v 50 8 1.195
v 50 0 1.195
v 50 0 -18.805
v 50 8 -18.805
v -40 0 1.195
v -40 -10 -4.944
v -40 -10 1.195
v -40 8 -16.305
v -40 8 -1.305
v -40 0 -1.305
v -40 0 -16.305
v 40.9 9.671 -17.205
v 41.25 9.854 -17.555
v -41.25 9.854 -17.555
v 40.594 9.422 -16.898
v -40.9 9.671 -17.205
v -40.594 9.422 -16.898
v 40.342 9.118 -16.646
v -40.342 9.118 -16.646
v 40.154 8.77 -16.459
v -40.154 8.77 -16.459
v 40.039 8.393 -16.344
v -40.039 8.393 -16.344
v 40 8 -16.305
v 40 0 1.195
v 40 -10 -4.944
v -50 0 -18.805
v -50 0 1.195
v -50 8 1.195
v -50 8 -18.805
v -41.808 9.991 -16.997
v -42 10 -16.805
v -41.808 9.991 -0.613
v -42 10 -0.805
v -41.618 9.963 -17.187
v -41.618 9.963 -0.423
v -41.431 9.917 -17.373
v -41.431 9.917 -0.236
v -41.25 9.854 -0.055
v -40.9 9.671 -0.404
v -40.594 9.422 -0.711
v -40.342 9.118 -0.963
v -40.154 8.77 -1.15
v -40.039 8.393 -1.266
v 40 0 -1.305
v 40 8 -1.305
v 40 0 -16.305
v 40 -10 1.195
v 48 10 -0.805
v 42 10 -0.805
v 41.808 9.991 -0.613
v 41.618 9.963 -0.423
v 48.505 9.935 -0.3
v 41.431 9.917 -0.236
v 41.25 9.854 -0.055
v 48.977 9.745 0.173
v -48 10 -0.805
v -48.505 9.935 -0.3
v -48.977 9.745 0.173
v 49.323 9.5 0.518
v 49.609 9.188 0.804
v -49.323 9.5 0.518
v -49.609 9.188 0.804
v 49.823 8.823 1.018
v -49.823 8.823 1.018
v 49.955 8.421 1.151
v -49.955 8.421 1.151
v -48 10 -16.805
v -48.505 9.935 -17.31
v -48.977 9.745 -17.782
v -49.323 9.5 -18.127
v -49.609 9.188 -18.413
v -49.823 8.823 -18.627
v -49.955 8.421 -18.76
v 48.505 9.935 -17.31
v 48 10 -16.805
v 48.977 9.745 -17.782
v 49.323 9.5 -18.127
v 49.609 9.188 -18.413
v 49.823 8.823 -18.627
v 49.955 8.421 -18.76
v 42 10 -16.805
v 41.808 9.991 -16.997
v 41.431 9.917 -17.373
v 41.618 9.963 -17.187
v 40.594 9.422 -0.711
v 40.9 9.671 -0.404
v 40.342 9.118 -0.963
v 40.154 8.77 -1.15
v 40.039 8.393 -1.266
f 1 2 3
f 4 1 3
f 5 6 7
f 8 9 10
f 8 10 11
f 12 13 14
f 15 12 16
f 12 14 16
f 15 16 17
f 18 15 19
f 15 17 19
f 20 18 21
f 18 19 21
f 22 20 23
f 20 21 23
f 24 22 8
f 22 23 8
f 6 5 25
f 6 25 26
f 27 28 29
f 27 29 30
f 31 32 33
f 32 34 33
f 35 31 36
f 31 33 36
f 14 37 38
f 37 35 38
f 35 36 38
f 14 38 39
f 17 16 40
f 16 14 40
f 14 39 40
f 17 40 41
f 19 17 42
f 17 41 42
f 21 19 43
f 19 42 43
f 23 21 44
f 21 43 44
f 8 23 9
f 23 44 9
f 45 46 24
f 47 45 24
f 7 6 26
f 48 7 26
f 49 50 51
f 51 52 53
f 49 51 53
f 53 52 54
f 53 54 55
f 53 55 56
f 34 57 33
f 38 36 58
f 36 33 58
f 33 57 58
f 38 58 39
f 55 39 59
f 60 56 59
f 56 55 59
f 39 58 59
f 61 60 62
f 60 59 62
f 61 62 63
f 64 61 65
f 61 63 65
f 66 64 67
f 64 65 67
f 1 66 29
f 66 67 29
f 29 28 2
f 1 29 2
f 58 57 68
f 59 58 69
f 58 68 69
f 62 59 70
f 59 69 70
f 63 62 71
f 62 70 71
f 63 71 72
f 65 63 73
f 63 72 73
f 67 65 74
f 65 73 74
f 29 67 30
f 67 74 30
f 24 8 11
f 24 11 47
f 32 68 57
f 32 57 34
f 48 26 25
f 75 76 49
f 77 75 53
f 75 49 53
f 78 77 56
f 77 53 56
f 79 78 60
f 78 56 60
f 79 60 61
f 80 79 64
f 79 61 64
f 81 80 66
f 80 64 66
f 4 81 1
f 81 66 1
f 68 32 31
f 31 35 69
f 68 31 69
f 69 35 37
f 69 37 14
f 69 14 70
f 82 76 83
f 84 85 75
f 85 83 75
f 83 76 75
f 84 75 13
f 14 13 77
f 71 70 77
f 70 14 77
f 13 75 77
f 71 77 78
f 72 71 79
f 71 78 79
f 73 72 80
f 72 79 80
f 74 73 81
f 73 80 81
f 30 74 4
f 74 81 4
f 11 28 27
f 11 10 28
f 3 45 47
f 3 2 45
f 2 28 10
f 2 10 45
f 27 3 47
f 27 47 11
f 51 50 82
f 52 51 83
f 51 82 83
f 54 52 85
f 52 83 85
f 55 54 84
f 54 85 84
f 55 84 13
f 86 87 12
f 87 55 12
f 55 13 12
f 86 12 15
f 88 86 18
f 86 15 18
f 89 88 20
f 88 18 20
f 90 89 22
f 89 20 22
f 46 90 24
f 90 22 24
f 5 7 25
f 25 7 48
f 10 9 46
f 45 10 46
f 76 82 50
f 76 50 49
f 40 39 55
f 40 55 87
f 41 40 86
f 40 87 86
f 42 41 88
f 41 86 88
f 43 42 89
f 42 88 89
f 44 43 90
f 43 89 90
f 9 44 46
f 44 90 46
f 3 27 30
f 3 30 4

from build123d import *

# Parameters (mm, degrees)
BOSS_EXTRUDE1_DEPTH      = 10
BOSS_EXTRUDE1_DEPTH_BACK = 10
SKETCH1_W                = 100
SKETCH1_H                = 20
CUT_EXTRUDE1_DEPTH       = 100
SKETCH3_W                = 80
SKETCH3_H                = 15
CUT_EXTRUDE2_DEPTH       = 10
FILLET3_R                = 2
CUT_EXTRUDE4_DEPTH       = 10
CUT_EXTRUDE5_DEPTH       = 10
CUT_EXTRUDE6_DEPTH       = 80


with BuildPart() as part:
    # Sketch1 → Boss-Extrude1 (new, two sides: drawn at the far end of the back side and taken through both)
    with BuildSketch(Plane(origin=(0, 0, 0), x_dir=(1, 0, 0), z_dir=(0, 1, 0)).offset(-BOSS_EXTRUDE1_DEPTH_BACK)):
        with Locations((0, 8.804664723)):
            Rectangle(SKETCH1_W, SKETCH1_H)
    extrude(amount=BOSS_EXTRUDE1_DEPTH + BOSS_EXTRUDE1_DEPTH_BACK)

    # Sketch2 → Cut-Extrude1 (cut)
    with BuildSketch(Plane(origin=(50, 0, 0), x_dir=(0, 0, -1), z_dir=(1, 0, 0))):
        Polygon((-1.195335277, 0), (18.804664723, 0), (18.804664723, -10), align=None)
    extrude(amount=-CUT_EXTRUDE1_DEPTH, mode=Mode.SUBTRACT)


with BuildPart() as cut_extrude1_piece_1:
    # of the separate pieces the step leaves, piece 1, a body of its own (cut_extrude1_pieces)
    add(part.part.solids().sort_by_distance((-50, 10, 1.195335277))[0])

    # Sketch3 → Cut-Extrude2 (cut)
    with BuildSketch(Plane(origin=(0, 10, 0), x_dir=(1, 0, 0), z_dir=(0, 1, 0))):
        with Locations((0, 8.804664723)):
            Rectangle(SKETCH3_W, SKETCH3_H)
    extrude(amount=-CUT_EXTRUDE2_DEPTH, mode=Mode.SUBTRACT)

    # Fillet3
    # the kernel refuses this fillet: 2 mm, written as the material it takes off along each edge
    with BuildSketch(Plane(origin=(40, 10, -16.304664723), x_dir=(1, 0, 0), z_dir=(0, 0, 1)), Plane(origin=(-40, 10, -1.304664723), x_dir=(-1, 0, 0), z_dir=(0, 0, -1))) as fillet3_piece_1:
        with BuildLine():
            CenterArc((FILLET3_R, -FILLET3_R), FILLET3_R, 90, 90)
            Line((0, -FILLET3_R), (-FILLET3_R * 0.02, -FILLET3_R))
            Line((-FILLET3_R * 0.02, -FILLET3_R), (-FILLET3_R * 0.02, FILLET3_R * 0.02))
            Line((-FILLET3_R * 0.02, FILLET3_R * 0.02), (FILLET3_R, FILLET3_R * 0.02))
            Line((FILLET3_R, FILLET3_R * 0.02), (FILLET3_R, 0))
        make_face()
    extrude(amount=15, mode=Mode.SUBTRACT)
    with BuildSketch(Plane(origin=(-40, 10, -16.304664723), x_dir=(0, 0, -1), z_dir=(1, 0, 0)), Plane(origin=(40, 10, -1.304664723), x_dir=(0, 0, 1), z_dir=(-1, 0, 0))) as fillet3_piece_2:
        with BuildLine():
            CenterArc((FILLET3_R, -FILLET3_R), FILLET3_R, 90, 90)
            Line((0, -FILLET3_R), (-FILLET3_R * 0.02, -FILLET3_R))
            Line((-FILLET3_R * 0.02, -FILLET3_R), (-FILLET3_R * 0.02, FILLET3_R * 0.02))
            Line((-FILLET3_R * 0.02, FILLET3_R * 0.02), (FILLET3_R, FILLET3_R * 0.02))
            Line((FILLET3_R, FILLET3_R * 0.02), (FILLET3_R, 0))
        make_face()
    extrude(amount=80, mode=Mode.SUBTRACT)
    with BuildSketch(Plane(origin=(50, 10, 1.195335277), x_dir=(0, -1, 0), z_dir=(0, 0, -1)), Plane(origin=(-50, 10, -18.804664723), x_dir=(0, -1, 0), z_dir=(0, 0, 1))) as fillet3_piece_3:
        with BuildLine():
            CenterArc((FILLET3_R, FILLET3_R), FILLET3_R, 180, 90)
            Line((0, FILLET3_R), (-FILLET3_R * 0.02, FILLET3_R))
            Line((-FILLET3_R * 0.02, FILLET3_R), (-FILLET3_R * 0.02, -FILLET3_R * 0.02))
            Line((-FILLET3_R * 0.02, -FILLET3_R * 0.02), (FILLET3_R, -FILLET3_R * 0.02))
            Line((FILLET3_R, -FILLET3_R * 0.02), (FILLET3_R, 0))
        make_face()
    extrude(amount=20, mode=Mode.SUBTRACT)
    with BuildSketch(Plane(origin=(50, 10, -18.804664723), x_dir=(0, 0, 1), z_dir=(-1, 0, 0))) as fillet3_piece_4:
        with BuildLine():
            CenterArc((FILLET3_R, -FILLET3_R), FILLET3_R, 90, 90)
            Line((0, -FILLET3_R), (-FILLET3_R * 0.02, -FILLET3_R))
            Line((-FILLET3_R * 0.02, -FILLET3_R), (-FILLET3_R * 0.02, FILLET3_R * 0.02))
            Line((-FILLET3_R * 0.02, FILLET3_R * 0.02), (FILLET3_R, FILLET3_R * 0.02))
            Line((FILLET3_R, FILLET3_R * 0.02), (FILLET3_R, 0))
        make_face()
    extrude(amount=100, mode=Mode.SUBTRACT)
    with BuildSketch(Plane(origin=(-50, 10, 1.195335277), x_dir=(0, -1, 0), z_dir=(1, 0, 0))) as fillet3_piece_5:
        with BuildLine():
            CenterArc((FILLET3_R, FILLET3_R), FILLET3_R, 180, 90)
            Line((0, FILLET3_R), (-FILLET3_R * 0.02, FILLET3_R))
            Line((-FILLET3_R * 0.02, FILLET3_R), (-FILLET3_R * 0.02, -FILLET3_R * 0.02))
            Line((-FILLET3_R * 0.02, -FILLET3_R * 0.02), (FILLET3_R, -FILLET3_R * 0.02))
            Line((FILLET3_R, -FILLET3_R * 0.02), (FILLET3_R, 0))
        make_face()
    extrude(amount=100, mode=Mode.SUBTRACT)
    with BuildSketch(Plane(origin=(40, 10, -21.304664723), x_dir=(1, 0, 0), z_dir=(0, 0, 1))) as fillet3_piece_6a_section:
        with BuildLine():
            CenterArc((FILLET3_R, -FILLET3_R), FILLET3_R, 90, 90)
            Line((0, -FILLET3_R), (-FILLET3_R * 0.02, -FILLET3_R))
            Line((-FILLET3_R * 0.02, -FILLET3_R), (-FILLET3_R * 0.02, FILLET3_R * 0.02))
            Line((-FILLET3_R * 0.02, FILLET3_R * 0.02), (FILLET3_R, FILLET3_R * 0.02))
            Line((FILLET3_R, FILLET3_R * 0.02), (FILLET3_R, 0))
        make_face()
    fillet3_piece_6a = extrude(amount=20, mode=Mode.PRIVATE)
    fillet3_piece_6a = split(fillet3_piece_6a, bisect_by=Plane(origin=(40.452790229, 9.547209771, -16.304664723), z_dir=(0, 0, -1)), keep=Keep.TOP, mode=Mode.PRIVATE)
    with BuildSketch(Plane(origin=(-40, 10, -16.304664723), x_dir=(0, 0, -1), z_dir=(1, 0, 0))) as fillet3_piece_6b_section:
        with BuildLine():
            CenterArc((FILLET3_R, -FILLET3_R), FILLET3_R, 90, 90)
            Line((0, -FILLET3_R), (-FILLET3_R * 0.02, -FILLET3_R))
            Line((-FILLET3_R * 0.02, -FILLET3_R), (-FILLET3_R * 0.02, FILLET3_R * 0.02))
            Line((-FILLET3_R * 0.02, FILLET3_R * 0.02), (FILLET3_R, FILLET3_R * 0.02))
            Line((FILLET3_R, FILLET3_R * 0.02), (FILLET3_R, 0))
        make_face()
    fillet3_piece_6b = extrude(amount=85, mode=Mode.PRIVATE)
    fillet3_piece_6b = split(fillet3_piece_6b, bisect_by=Plane(origin=(40, 9.547209771, -16.757454952), z_dir=(1, 0, 0)), keep=Keep.TOP, mode=Mode.PRIVATE)
    fillet3_piece_6 = fillet3_piece_6a & fillet3_piece_6b
    add(fillet3_piece_6, mode=Mode.SUBTRACT)
    with BuildSketch(Plane(origin=(45, 10, -1.304664723), x_dir=(0, 0, 1), z_dir=(-1, 0, 0))) as fillet3_piece_7a_section:
        with BuildLine():
            CenterArc((FILLET3_R, -FILLET3_R), FILLET3_R, 90, 90)
            Line((0, -FILLET3_R), (-FILLET3_R * 0.02, -FILLET3_R))
            Line((-FILLET3_R * 0.02, -FILLET3_R), (-FILLET3_R * 0.02, FILLET3_R * 0.02))
            Line((-FILLET3_R * 0.02, FILLET3_R * 0.02), (FILLET3_R, FILLET3_R * 0.02))
            Line((FILLET3_R, FILLET3_R * 0.02), (FILLET3_R, 0))
        make_face()
    fillet3_piece_7a = extrude(amount=85, mode=Mode.PRIVATE)
    fillet3_piece_7a = split(fillet3_piece_7a, bisect_by=Plane(origin=(40, 9.547209771, -0.851874494), z_dir=(1, 0, 0)), keep=Keep.TOP, mode=Mode.PRIVATE)
    with BuildSketch(Plane(origin=(40, 10, -16.304664723), x_dir=(1, 0, 0), z_dir=(0, 0, 1))) as fillet3_piece_7b_section:
        with BuildLine():
            CenterArc((FILLET3_R, -FILLET3_R), FILLET3_R, 90, 90)
            Line((0, -FILLET3_R), (-FILLET3_R * 0.02, -FILLET3_R))
            Line((-FILLET3_R * 0.02, -FILLET3_R), (-FILLET3_R * 0.02, FILLET3_R * 0.02))
            Line((-FILLET3_R * 0.02, FILLET3_R * 0.02), (FILLET3_R, FILLET3_R * 0.02))
            Line((FILLET3_R, FILLET3_R * 0.02), (FILLET3_R, 0))
        make_face()
    fillet3_piece_7b = extrude(amount=20, mode=Mode.PRIVATE)
    fillet3_piece_7b = split(fillet3_piece_7b, bisect_by=Plane(origin=(40.452790229, 9.547209771, -1.304664723), z_dir=(0, 0, 1)), keep=Keep.TOP, mode=Mode.PRIVATE)
    fillet3_piece_7 = fillet3_piece_7a & fillet3_piece_7b
    add(fillet3_piece_7, mode=Mode.SUBTRACT)
    with BuildSketch(Plane(origin=(-40, 10, -1.304664723), x_dir=(-1, 0, 0), z_dir=(0, 0, -1))) as fillet3_piece_8a_section:
        with BuildLine():
            CenterArc((FILLET3_R, -FILLET3_R), FILLET3_R, 90, 90)
            Line((0, -FILLET3_R), (-FILLET3_R * 0.02, -FILLET3_R))
            Line((-FILLET3_R * 0.02, -FILLET3_R), (-FILLET3_R * 0.02, FILLET3_R * 0.02))
            Line((-FILLET3_R * 0.02, FILLET3_R * 0.02), (FILLET3_R, FILLET3_R * 0.02))
            Line((FILLET3_R, FILLET3_R * 0.02), (FILLET3_R, 0))
        make_face()
    fillet3_piece_8a = extrude(amount=20, mode=Mode.PRIVATE)
    fillet3_piece_8a = split(fillet3_piece_8a, bisect_by=Plane(origin=(-40.452790229, 9.547209771, -16.304664723), z_dir=(0, 0, -1)), keep=Keep.TOP, mode=Mode.PRIVATE)
    with BuildSketch(Plane(origin=(-45, 10, -16.304664723), x_dir=(0, 0, -1), z_dir=(1, 0, 0))) as fillet3_piece_8b_section:
        with BuildLine():
            CenterArc((FILLET3_R, -FILLET3_R), FILLET3_R, 90, 90)
            Line((0, -FILLET3_R), (-FILLET3_R * 0.02, -FILLET3_R))
            Line((-FILLET3_R * 0.02, -FILLET3_R), (-FILLET3_R * 0.02, FILLET3_R * 0.02))
            Line((-FILLET3_R * 0.02, FILLET3_R * 0.02), (FILLET3_R, FILLET3_R * 0.02))
            Line((FILLET3_R, FILLET3_R * 0.02), (FILLET3_R, 0))
        make_face()
    fillet3_piece_8b = extrude(amount=85, mode=Mode.PRIVATE)
    fillet3_piece_8b = split(fillet3_piece_8b, bisect_by=Plane(origin=(-40, 9.547209771, -16.757454952), z_dir=(-1, 0, 0)), keep=Keep.TOP, mode=Mode.PRIVATE)
    fillet3_piece_8 = fillet3_piece_8a & fillet3_piece_8b
    add(fillet3_piece_8, mode=Mode.SUBTRACT)
    with BuildSketch(Plane(origin=(-40, 10, 3.695335277), x_dir=(-1, 0, 0), z_dir=(0, 0, -1))) as fillet3_piece_9a_section:
        with BuildLine():
            CenterArc((FILLET3_R, -FILLET3_R), FILLET3_R, 90, 90)
            Line((0, -FILLET3_R), (-FILLET3_R * 0.02, -FILLET3_R))
            Line((-FILLET3_R * 0.02, -FILLET3_R), (-FILLET3_R * 0.02, FILLET3_R * 0.02))
            Line((-FILLET3_R * 0.02, FILLET3_R * 0.02), (FILLET3_R, FILLET3_R * 0.02))
            Line((FILLET3_R, FILLET3_R * 0.02), (FILLET3_R, 0))
        make_face()
    fillet3_piece_9a = extrude(amount=20, mode=Mode.PRIVATE)
    fillet3_piece_9a = split(fillet3_piece_9a, bisect_by=Plane(origin=(-40.452790229, 9.547209771, -1.304664723), z_dir=(0, 0, 1)), keep=Keep.TOP, mode=Mode.PRIVATE)
    with BuildSketch(Plane(origin=(40, 10, -1.304664723), x_dir=(0, 0, 1), z_dir=(-1, 0, 0))) as fillet3_piece_9b_section:
        with BuildLine():
            CenterArc((FILLET3_R, -FILLET3_R), FILLET3_R, 90, 90)
            Line((0, -FILLET3_R), (-FILLET3_R * 0.02, -FILLET3_R))
            Line((-FILLET3_R * 0.02, -FILLET3_R), (-FILLET3_R * 0.02, FILLET3_R * 0.02))
            Line((-FILLET3_R * 0.02, FILLET3_R * 0.02), (FILLET3_R, FILLET3_R * 0.02))
            Line((FILLET3_R, FILLET3_R * 0.02), (FILLET3_R, 0))
        make_face()
    fillet3_piece_9b = extrude(amount=85, mode=Mode.PRIVATE)
    fillet3_piece_9b = split(fillet3_piece_9b, bisect_by=Plane(origin=(-40, 9.547209771, -0.851874494), z_dir=(-1, 0, 0)), keep=Keep.TOP, mode=Mode.PRIVATE)
    fillet3_piece_9 = fillet3_piece_9a & fillet3_piece_9b
    add(fillet3_piece_9, mode=Mode.SUBTRACT)
    with BuildSketch(Plane(origin=(-50, 10, 1.195335277), x_dir=(0, -1, 0), z_dir=(1, 0, 0))) as fillet3_piece_10a_section:
        with BuildLine():
            CenterArc((FILLET3_R, FILLET3_R), FILLET3_R, 180, 90)
            Line((0, FILLET3_R), (-FILLET3_R * 0.02, FILLET3_R))
            Line((-FILLET3_R * 0.02, FILLET3_R), (-FILLET3_R * 0.02, -FILLET3_R * 0.02))
            Line((-FILLET3_R * 0.02, -FILLET3_R * 0.02), (FILLET3_R, -FILLET3_R * 0.02))
            Line((FILLET3_R, -FILLET3_R * 0.02), (FILLET3_R, 0))
        make_face()
    fillet3_piece_10a = extrude(amount=105, mode=Mode.PRIVATE)
    fillet3_piece_10a = split(fillet3_piece_10a, bisect_by=Plane(origin=(50, 9.547209771, 0.742545048), z_dir=(1, 0, 0)), keep=Keep.TOP, mode=Mode.PRIVATE)
    with BuildSketch(Plane(origin=(50, 10, 6.195335277), x_dir=(0, -1, 0), z_dir=(0, 0, -1))) as fillet3_piece_10b_section:
        with BuildLine():
            CenterArc((FILLET3_R, FILLET3_R), FILLET3_R, 180, 90)
            Line((0, FILLET3_R), (-FILLET3_R * 0.02, FILLET3_R))
            Line((-FILLET3_R * 0.02, FILLET3_R), (-FILLET3_R * 0.02, -FILLET3_R * 0.02))
            Line((-FILLET3_R * 0.02, -FILLET3_R * 0.02), (FILLET3_R, -FILLET3_R * 0.02))
            Line((FILLET3_R, -FILLET3_R * 0.02), (FILLET3_R, 0))
        make_face()
    fillet3_piece_10b = extrude(amount=25, mode=Mode.PRIVATE)
    fillet3_piece_10b = split(fillet3_piece_10b, bisect_by=Plane(origin=(49.547209771, 9.547209771, 1.195335277), z_dir=(0, 0, 1)), keep=Keep.TOP, mode=Mode.PRIVATE)
    fillet3_piece_10 = fillet3_piece_10a & fillet3_piece_10b
    add(fillet3_piece_10, mode=Mode.SUBTRACT)
    with BuildSketch(Plane(origin=(50, 10, 1.195335277), x_dir=(0, -1, 0), z_dir=(0, 0, -1))) as fillet3_piece_11a_section:
        with BuildLine():
            CenterArc((FILLET3_R, FILLET3_R), FILLET3_R, 180, 90)
            Line((0, FILLET3_R), (-FILLET3_R * 0.02, FILLET3_R))
            Line((-FILLET3_R * 0.02, FILLET3_R), (-FILLET3_R * 0.02, -FILLET3_R * 0.02))
            Line((-FILLET3_R * 0.02, -FILLET3_R * 0.02), (FILLET3_R, -FILLET3_R * 0.02))
            Line((FILLET3_R, -FILLET3_R * 0.02), (FILLET3_R, 0))
        make_face()
    fillet3_piece_11a = extrude(amount=25, mode=Mode.PRIVATE)
    fillet3_piece_11a = split(fillet3_piece_11a, bisect_by=Plane(origin=(49.547209771, 9.547209771, -18.804664723), z_dir=(0, 0, -1)), keep=Keep.TOP, mode=Mode.PRIVATE)
    with BuildSketch(Plane(origin=(55, 10, -18.804664723), x_dir=(0, 0, 1), z_dir=(-1, 0, 0))) as fillet3_piece_11b_section:
        with BuildLine():
            CenterArc((FILLET3_R, -FILLET3_R), FILLET3_R, 90, 90)
            Line((0, -FILLET3_R), (-FILLET3_R * 0.02, -FILLET3_R))
            Line((-FILLET3_R * 0.02, -FILLET3_R), (-FILLET3_R * 0.02, FILLET3_R * 0.02))
            Line((-FILLET3_R * 0.02, FILLET3_R * 0.02), (FILLET3_R, FILLET3_R * 0.02))
            Line((FILLET3_R, FILLET3_R * 0.02), (FILLET3_R, 0))
        make_face()
    fillet3_piece_11b = extrude(amount=105, mode=Mode.PRIVATE)
    fillet3_piece_11b = split(fillet3_piece_11b, bisect_by=Plane(origin=(50, 9.547209771, -18.351874494), z_dir=(1, 0, 0)), keep=Keep.TOP, mode=Mode.PRIVATE)
    fillet3_piece_11 = fillet3_piece_11a & fillet3_piece_11b
    add(fillet3_piece_11, mode=Mode.SUBTRACT)
    with BuildSketch(Plane(origin=(-50, 10, -23.804664723), x_dir=(0, -1, 0), z_dir=(0, 0, 1))) as fillet3_piece_12a_section:
        with BuildLine():
            CenterArc((FILLET3_R, FILLET3_R), FILLET3_R, 180, 90)
            Line((0, FILLET3_R), (-FILLET3_R * 0.02, FILLET3_R))
            Line((-FILLET3_R * 0.02, FILLET3_R), (-FILLET3_R * 0.02, -FILLET3_R * 0.02))
            Line((-FILLET3_R * 0.02, -FILLET3_R * 0.02), (FILLET3_R, -FILLET3_R * 0.02))
            Line((FILLET3_R, -FILLET3_R * 0.02), (FILLET3_R, 0))
        make_face()
    fillet3_piece_12a = extrude(amount=25, mode=Mode.PRIVATE)
    fillet3_piece_12a = split(fillet3_piece_12a, bisect_by=Plane(origin=(-49.547209771, 9.547209771, -18.804664723), z_dir=(0, 0, -1)), keep=Keep.TOP, mode=Mode.PRIVATE)
    with BuildSketch(Plane(origin=(50, 10, -18.804664723), x_dir=(0, 0, 1), z_dir=(-1, 0, 0))) as fillet3_piece_12b_section:
        with BuildLine():
            CenterArc((FILLET3_R, -FILLET3_R), FILLET3_R, 90, 90)
            Line((0, -FILLET3_R), (-FILLET3_R * 0.02, -FILLET3_R))
            Line((-FILLET3_R * 0.02, -FILLET3_R), (-FILLET3_R * 0.02, FILLET3_R * 0.02))
            Line((-FILLET3_R * 0.02, FILLET3_R * 0.02), (FILLET3_R, FILLET3_R * 0.02))
            Line((FILLET3_R, FILLET3_R * 0.02), (FILLET3_R, 0))
        make_face()
    fillet3_piece_12b = extrude(amount=105, mode=Mode.PRIVATE)
    fillet3_piece_12b = split(fillet3_piece_12b, bisect_by=Plane(origin=(-50, 9.547209771, -18.351874494), z_dir=(-1, 0, 0)), keep=Keep.TOP, mode=Mode.PRIVATE)
    fillet3_piece_12 = fillet3_piece_12a & fillet3_piece_12b
    add(fillet3_piece_12, mode=Mode.SUBTRACT)
    with BuildSketch(Plane(origin=(-55, 10, 1.195335277), x_dir=(0, -1, 0), z_dir=(1, 0, 0))) as fillet3_piece_13a_section:
        with BuildLine():
            CenterArc((FILLET3_R, FILLET3_R), FILLET3_R, 180, 90)
            Line((0, FILLET3_R), (-FILLET3_R * 0.02, FILLET3_R))
            Line((-FILLET3_R * 0.02, FILLET3_R), (-FILLET3_R * 0.02, -FILLET3_R * 0.02))
            Line((-FILLET3_R * 0.02, -FILLET3_R * 0.02), (FILLET3_R, -FILLET3_R * 0.02))
            Line((FILLET3_R, -FILLET3_R * 0.02), (FILLET3_R, 0))
        make_face()
    fillet3_piece_13a = extrude(amount=105, mode=Mode.PRIVATE)
    fillet3_piece_13a = split(fillet3_piece_13a, bisect_by=Plane(origin=(-50, 9.547209771, 0.742545048), z_dir=(-1, 0, 0)), keep=Keep.TOP, mode=Mode.PRIVATE)
    with BuildSketch(Plane(origin=(-50, 10, -18.804664723), x_dir=(0, -1, 0), z_dir=(0, 0, 1))) as fillet3_piece_13b_section:
        with BuildLine():
            CenterArc((FILLET3_R, FILLET3_R), FILLET3_R, 180, 90)
            Line((0, FILLET3_R), (-FILLET3_R * 0.02, FILLET3_R))
            Line((-FILLET3_R * 0.02, FILLET3_R), (-FILLET3_R * 0.02, -FILLET3_R * 0.02))
            Line((-FILLET3_R * 0.02, -FILLET3_R * 0.02), (FILLET3_R, -FILLET3_R * 0.02))
            Line((FILLET3_R, -FILLET3_R * 0.02), (FILLET3_R, 0))
        make_face()
    fillet3_piece_13b = extrude(amount=25, mode=Mode.PRIVATE)
    fillet3_piece_13b = split(fillet3_piece_13b, bisect_by=Plane(origin=(-49.547209771, 9.547209771, 1.195335277), z_dir=(0, 0, 1)), keep=Keep.TOP, mode=Mode.PRIVATE)
    fillet3_piece_13 = fillet3_piece_13a & fillet3_piece_13b
    add(fillet3_piece_13, mode=Mode.SUBTRACT)


with BuildPart() as cut_extrude1_piece_2:
    # of the separate pieces the step leaves, piece 2, a body of its own (cut_extrude1_pieces)
    add(part.part.solids().sort_by_distance((-50, -10, 1.195335277))[0])

    # Sketch4 → Cut-Extrude4 (cut)
    with BuildSketch(Plane.ZY.offset(50)):
        Polygon((1.195335277, -10), (1.195335277, 0), (-18.804664723, -10), align=None)
    extrude(amount=-CUT_EXTRUDE4_DEPTH, mode=Mode.SUBTRACT)

    # Sketch5 → Cut-Extrude5 (cut)
    with BuildSketch(Plane(origin=(50, 0, 0), x_dir=(0, 0, -1), z_dir=(1, 0, 0))):
        Polygon((-1.195335277, -10), (-1.195335277, 0), (18.804664723, -10), align=None)
    extrude(amount=-CUT_EXTRUDE5_DEPTH, mode=Mode.SUBTRACT)

    # Sketch6 → Cut-Extrude6 (cut)
    with BuildSketch(Plane.ZY.offset(40)):
        Polygon((1.195335277, 0), (-4.944370746, -10), (-18.804664723, -10), align=None)
    extrude(amount=-CUT_EXTRUDE6_DEPTH, mode=Mode.SUBTRACT)


solid = Compound([cut_extrude1_piece_1.part, cut_extrude1_piece_2.part])
